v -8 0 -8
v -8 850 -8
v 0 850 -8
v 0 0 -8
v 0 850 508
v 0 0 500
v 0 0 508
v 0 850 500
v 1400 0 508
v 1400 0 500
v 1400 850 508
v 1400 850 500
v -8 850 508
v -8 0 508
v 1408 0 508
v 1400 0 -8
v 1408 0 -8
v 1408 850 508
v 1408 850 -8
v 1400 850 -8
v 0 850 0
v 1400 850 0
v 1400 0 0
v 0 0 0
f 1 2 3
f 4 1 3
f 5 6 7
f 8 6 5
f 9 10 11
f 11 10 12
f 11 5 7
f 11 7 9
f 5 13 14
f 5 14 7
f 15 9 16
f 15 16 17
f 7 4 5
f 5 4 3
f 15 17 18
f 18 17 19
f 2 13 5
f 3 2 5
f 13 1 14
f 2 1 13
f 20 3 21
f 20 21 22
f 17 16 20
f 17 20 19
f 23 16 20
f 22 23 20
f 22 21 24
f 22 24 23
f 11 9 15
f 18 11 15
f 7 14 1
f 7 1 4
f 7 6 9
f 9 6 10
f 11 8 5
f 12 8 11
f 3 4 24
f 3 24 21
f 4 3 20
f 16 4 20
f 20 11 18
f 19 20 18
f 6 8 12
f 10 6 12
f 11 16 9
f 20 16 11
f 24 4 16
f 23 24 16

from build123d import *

# Parameters (mm, degrees)
PC_OBSERVATION_WALL_LEFT_T8_START  = -8
SKETCH_1_W                         = 1400
SKETCH_1_H                         = 850
PC_OBSERVATION_WALL_LEFT_T8_DEPTH  = 8
PC_OBSERVATION_WALL_RIGHT_T8_START = 500
SKETCH_2_W                         = 1400
SKETCH_2_H                         = 850
PC_OBSERVATION_WALL_RIGHT_T8_DEPTH = 8
PC_REAR_END_T8_START               = -8
SKETCH_3_W                         = 8
SKETCH_3_H                         = 850
PC_REAR_END_T8_DEPTH               = 516
PC_TOE_END_T8_START                = -8
SKETCH_4_W                         = 8
SKETCH_4_H                         = 850
PC_TOE_END_T8_DEPTH                = 516


with BuildPart() as part:
    # 草图1 → PC_observation_wall_left_t8 (new body)
    with BuildSketch(Plane.XY.offset(PC_OBSERVATION_WALL_LEFT_T8_START)):
        with Locations((700, 425)):
            Rectangle(SKETCH_1_W, SKETCH_1_H)
    extrude(amount=PC_OBSERVATION_WALL_LEFT_T8_DEPTH)


with BuildPart() as body_2:
    # 草图2 → PC_observation_wall_right_t8 (new body)
    with BuildSketch(Plane.XY.offset(PC_OBSERVATION_WALL_RIGHT_T8_START)):
        with Locations((700, 425)):
            Rectangle(SKETCH_2_W, SKETCH_2_H)
    extrude(amount=PC_OBSERVATION_WALL_RIGHT_T8_DEPTH)


with BuildPart() as body_3:
    # 草图3 → PC_rear_end_t8 (new body)
    with BuildSketch(Plane.XY.offset(PC_REAR_END_T8_START)):
        with Locations((-4, 425)):
            Rectangle(SKETCH_3_W, SKETCH_3_H)
    extrude(amount=PC_REAR_END_T8_DEPTH)


with BuildPart() as body_4:
    # 草图4 → PC_toe_end_t8 (new body)
    with BuildSketch(Plane.XY.offset(PC_TOE_END_T8_START)):
        with Locations((1404, 425)):
            Rectangle(SKETCH_4_W, SKETCH_4_H)
    extrude(amount=PC_TOE_END_T8_DEPTH)


solid = Compound([part.part, body_2.part, body_3.part, body_4.part])
